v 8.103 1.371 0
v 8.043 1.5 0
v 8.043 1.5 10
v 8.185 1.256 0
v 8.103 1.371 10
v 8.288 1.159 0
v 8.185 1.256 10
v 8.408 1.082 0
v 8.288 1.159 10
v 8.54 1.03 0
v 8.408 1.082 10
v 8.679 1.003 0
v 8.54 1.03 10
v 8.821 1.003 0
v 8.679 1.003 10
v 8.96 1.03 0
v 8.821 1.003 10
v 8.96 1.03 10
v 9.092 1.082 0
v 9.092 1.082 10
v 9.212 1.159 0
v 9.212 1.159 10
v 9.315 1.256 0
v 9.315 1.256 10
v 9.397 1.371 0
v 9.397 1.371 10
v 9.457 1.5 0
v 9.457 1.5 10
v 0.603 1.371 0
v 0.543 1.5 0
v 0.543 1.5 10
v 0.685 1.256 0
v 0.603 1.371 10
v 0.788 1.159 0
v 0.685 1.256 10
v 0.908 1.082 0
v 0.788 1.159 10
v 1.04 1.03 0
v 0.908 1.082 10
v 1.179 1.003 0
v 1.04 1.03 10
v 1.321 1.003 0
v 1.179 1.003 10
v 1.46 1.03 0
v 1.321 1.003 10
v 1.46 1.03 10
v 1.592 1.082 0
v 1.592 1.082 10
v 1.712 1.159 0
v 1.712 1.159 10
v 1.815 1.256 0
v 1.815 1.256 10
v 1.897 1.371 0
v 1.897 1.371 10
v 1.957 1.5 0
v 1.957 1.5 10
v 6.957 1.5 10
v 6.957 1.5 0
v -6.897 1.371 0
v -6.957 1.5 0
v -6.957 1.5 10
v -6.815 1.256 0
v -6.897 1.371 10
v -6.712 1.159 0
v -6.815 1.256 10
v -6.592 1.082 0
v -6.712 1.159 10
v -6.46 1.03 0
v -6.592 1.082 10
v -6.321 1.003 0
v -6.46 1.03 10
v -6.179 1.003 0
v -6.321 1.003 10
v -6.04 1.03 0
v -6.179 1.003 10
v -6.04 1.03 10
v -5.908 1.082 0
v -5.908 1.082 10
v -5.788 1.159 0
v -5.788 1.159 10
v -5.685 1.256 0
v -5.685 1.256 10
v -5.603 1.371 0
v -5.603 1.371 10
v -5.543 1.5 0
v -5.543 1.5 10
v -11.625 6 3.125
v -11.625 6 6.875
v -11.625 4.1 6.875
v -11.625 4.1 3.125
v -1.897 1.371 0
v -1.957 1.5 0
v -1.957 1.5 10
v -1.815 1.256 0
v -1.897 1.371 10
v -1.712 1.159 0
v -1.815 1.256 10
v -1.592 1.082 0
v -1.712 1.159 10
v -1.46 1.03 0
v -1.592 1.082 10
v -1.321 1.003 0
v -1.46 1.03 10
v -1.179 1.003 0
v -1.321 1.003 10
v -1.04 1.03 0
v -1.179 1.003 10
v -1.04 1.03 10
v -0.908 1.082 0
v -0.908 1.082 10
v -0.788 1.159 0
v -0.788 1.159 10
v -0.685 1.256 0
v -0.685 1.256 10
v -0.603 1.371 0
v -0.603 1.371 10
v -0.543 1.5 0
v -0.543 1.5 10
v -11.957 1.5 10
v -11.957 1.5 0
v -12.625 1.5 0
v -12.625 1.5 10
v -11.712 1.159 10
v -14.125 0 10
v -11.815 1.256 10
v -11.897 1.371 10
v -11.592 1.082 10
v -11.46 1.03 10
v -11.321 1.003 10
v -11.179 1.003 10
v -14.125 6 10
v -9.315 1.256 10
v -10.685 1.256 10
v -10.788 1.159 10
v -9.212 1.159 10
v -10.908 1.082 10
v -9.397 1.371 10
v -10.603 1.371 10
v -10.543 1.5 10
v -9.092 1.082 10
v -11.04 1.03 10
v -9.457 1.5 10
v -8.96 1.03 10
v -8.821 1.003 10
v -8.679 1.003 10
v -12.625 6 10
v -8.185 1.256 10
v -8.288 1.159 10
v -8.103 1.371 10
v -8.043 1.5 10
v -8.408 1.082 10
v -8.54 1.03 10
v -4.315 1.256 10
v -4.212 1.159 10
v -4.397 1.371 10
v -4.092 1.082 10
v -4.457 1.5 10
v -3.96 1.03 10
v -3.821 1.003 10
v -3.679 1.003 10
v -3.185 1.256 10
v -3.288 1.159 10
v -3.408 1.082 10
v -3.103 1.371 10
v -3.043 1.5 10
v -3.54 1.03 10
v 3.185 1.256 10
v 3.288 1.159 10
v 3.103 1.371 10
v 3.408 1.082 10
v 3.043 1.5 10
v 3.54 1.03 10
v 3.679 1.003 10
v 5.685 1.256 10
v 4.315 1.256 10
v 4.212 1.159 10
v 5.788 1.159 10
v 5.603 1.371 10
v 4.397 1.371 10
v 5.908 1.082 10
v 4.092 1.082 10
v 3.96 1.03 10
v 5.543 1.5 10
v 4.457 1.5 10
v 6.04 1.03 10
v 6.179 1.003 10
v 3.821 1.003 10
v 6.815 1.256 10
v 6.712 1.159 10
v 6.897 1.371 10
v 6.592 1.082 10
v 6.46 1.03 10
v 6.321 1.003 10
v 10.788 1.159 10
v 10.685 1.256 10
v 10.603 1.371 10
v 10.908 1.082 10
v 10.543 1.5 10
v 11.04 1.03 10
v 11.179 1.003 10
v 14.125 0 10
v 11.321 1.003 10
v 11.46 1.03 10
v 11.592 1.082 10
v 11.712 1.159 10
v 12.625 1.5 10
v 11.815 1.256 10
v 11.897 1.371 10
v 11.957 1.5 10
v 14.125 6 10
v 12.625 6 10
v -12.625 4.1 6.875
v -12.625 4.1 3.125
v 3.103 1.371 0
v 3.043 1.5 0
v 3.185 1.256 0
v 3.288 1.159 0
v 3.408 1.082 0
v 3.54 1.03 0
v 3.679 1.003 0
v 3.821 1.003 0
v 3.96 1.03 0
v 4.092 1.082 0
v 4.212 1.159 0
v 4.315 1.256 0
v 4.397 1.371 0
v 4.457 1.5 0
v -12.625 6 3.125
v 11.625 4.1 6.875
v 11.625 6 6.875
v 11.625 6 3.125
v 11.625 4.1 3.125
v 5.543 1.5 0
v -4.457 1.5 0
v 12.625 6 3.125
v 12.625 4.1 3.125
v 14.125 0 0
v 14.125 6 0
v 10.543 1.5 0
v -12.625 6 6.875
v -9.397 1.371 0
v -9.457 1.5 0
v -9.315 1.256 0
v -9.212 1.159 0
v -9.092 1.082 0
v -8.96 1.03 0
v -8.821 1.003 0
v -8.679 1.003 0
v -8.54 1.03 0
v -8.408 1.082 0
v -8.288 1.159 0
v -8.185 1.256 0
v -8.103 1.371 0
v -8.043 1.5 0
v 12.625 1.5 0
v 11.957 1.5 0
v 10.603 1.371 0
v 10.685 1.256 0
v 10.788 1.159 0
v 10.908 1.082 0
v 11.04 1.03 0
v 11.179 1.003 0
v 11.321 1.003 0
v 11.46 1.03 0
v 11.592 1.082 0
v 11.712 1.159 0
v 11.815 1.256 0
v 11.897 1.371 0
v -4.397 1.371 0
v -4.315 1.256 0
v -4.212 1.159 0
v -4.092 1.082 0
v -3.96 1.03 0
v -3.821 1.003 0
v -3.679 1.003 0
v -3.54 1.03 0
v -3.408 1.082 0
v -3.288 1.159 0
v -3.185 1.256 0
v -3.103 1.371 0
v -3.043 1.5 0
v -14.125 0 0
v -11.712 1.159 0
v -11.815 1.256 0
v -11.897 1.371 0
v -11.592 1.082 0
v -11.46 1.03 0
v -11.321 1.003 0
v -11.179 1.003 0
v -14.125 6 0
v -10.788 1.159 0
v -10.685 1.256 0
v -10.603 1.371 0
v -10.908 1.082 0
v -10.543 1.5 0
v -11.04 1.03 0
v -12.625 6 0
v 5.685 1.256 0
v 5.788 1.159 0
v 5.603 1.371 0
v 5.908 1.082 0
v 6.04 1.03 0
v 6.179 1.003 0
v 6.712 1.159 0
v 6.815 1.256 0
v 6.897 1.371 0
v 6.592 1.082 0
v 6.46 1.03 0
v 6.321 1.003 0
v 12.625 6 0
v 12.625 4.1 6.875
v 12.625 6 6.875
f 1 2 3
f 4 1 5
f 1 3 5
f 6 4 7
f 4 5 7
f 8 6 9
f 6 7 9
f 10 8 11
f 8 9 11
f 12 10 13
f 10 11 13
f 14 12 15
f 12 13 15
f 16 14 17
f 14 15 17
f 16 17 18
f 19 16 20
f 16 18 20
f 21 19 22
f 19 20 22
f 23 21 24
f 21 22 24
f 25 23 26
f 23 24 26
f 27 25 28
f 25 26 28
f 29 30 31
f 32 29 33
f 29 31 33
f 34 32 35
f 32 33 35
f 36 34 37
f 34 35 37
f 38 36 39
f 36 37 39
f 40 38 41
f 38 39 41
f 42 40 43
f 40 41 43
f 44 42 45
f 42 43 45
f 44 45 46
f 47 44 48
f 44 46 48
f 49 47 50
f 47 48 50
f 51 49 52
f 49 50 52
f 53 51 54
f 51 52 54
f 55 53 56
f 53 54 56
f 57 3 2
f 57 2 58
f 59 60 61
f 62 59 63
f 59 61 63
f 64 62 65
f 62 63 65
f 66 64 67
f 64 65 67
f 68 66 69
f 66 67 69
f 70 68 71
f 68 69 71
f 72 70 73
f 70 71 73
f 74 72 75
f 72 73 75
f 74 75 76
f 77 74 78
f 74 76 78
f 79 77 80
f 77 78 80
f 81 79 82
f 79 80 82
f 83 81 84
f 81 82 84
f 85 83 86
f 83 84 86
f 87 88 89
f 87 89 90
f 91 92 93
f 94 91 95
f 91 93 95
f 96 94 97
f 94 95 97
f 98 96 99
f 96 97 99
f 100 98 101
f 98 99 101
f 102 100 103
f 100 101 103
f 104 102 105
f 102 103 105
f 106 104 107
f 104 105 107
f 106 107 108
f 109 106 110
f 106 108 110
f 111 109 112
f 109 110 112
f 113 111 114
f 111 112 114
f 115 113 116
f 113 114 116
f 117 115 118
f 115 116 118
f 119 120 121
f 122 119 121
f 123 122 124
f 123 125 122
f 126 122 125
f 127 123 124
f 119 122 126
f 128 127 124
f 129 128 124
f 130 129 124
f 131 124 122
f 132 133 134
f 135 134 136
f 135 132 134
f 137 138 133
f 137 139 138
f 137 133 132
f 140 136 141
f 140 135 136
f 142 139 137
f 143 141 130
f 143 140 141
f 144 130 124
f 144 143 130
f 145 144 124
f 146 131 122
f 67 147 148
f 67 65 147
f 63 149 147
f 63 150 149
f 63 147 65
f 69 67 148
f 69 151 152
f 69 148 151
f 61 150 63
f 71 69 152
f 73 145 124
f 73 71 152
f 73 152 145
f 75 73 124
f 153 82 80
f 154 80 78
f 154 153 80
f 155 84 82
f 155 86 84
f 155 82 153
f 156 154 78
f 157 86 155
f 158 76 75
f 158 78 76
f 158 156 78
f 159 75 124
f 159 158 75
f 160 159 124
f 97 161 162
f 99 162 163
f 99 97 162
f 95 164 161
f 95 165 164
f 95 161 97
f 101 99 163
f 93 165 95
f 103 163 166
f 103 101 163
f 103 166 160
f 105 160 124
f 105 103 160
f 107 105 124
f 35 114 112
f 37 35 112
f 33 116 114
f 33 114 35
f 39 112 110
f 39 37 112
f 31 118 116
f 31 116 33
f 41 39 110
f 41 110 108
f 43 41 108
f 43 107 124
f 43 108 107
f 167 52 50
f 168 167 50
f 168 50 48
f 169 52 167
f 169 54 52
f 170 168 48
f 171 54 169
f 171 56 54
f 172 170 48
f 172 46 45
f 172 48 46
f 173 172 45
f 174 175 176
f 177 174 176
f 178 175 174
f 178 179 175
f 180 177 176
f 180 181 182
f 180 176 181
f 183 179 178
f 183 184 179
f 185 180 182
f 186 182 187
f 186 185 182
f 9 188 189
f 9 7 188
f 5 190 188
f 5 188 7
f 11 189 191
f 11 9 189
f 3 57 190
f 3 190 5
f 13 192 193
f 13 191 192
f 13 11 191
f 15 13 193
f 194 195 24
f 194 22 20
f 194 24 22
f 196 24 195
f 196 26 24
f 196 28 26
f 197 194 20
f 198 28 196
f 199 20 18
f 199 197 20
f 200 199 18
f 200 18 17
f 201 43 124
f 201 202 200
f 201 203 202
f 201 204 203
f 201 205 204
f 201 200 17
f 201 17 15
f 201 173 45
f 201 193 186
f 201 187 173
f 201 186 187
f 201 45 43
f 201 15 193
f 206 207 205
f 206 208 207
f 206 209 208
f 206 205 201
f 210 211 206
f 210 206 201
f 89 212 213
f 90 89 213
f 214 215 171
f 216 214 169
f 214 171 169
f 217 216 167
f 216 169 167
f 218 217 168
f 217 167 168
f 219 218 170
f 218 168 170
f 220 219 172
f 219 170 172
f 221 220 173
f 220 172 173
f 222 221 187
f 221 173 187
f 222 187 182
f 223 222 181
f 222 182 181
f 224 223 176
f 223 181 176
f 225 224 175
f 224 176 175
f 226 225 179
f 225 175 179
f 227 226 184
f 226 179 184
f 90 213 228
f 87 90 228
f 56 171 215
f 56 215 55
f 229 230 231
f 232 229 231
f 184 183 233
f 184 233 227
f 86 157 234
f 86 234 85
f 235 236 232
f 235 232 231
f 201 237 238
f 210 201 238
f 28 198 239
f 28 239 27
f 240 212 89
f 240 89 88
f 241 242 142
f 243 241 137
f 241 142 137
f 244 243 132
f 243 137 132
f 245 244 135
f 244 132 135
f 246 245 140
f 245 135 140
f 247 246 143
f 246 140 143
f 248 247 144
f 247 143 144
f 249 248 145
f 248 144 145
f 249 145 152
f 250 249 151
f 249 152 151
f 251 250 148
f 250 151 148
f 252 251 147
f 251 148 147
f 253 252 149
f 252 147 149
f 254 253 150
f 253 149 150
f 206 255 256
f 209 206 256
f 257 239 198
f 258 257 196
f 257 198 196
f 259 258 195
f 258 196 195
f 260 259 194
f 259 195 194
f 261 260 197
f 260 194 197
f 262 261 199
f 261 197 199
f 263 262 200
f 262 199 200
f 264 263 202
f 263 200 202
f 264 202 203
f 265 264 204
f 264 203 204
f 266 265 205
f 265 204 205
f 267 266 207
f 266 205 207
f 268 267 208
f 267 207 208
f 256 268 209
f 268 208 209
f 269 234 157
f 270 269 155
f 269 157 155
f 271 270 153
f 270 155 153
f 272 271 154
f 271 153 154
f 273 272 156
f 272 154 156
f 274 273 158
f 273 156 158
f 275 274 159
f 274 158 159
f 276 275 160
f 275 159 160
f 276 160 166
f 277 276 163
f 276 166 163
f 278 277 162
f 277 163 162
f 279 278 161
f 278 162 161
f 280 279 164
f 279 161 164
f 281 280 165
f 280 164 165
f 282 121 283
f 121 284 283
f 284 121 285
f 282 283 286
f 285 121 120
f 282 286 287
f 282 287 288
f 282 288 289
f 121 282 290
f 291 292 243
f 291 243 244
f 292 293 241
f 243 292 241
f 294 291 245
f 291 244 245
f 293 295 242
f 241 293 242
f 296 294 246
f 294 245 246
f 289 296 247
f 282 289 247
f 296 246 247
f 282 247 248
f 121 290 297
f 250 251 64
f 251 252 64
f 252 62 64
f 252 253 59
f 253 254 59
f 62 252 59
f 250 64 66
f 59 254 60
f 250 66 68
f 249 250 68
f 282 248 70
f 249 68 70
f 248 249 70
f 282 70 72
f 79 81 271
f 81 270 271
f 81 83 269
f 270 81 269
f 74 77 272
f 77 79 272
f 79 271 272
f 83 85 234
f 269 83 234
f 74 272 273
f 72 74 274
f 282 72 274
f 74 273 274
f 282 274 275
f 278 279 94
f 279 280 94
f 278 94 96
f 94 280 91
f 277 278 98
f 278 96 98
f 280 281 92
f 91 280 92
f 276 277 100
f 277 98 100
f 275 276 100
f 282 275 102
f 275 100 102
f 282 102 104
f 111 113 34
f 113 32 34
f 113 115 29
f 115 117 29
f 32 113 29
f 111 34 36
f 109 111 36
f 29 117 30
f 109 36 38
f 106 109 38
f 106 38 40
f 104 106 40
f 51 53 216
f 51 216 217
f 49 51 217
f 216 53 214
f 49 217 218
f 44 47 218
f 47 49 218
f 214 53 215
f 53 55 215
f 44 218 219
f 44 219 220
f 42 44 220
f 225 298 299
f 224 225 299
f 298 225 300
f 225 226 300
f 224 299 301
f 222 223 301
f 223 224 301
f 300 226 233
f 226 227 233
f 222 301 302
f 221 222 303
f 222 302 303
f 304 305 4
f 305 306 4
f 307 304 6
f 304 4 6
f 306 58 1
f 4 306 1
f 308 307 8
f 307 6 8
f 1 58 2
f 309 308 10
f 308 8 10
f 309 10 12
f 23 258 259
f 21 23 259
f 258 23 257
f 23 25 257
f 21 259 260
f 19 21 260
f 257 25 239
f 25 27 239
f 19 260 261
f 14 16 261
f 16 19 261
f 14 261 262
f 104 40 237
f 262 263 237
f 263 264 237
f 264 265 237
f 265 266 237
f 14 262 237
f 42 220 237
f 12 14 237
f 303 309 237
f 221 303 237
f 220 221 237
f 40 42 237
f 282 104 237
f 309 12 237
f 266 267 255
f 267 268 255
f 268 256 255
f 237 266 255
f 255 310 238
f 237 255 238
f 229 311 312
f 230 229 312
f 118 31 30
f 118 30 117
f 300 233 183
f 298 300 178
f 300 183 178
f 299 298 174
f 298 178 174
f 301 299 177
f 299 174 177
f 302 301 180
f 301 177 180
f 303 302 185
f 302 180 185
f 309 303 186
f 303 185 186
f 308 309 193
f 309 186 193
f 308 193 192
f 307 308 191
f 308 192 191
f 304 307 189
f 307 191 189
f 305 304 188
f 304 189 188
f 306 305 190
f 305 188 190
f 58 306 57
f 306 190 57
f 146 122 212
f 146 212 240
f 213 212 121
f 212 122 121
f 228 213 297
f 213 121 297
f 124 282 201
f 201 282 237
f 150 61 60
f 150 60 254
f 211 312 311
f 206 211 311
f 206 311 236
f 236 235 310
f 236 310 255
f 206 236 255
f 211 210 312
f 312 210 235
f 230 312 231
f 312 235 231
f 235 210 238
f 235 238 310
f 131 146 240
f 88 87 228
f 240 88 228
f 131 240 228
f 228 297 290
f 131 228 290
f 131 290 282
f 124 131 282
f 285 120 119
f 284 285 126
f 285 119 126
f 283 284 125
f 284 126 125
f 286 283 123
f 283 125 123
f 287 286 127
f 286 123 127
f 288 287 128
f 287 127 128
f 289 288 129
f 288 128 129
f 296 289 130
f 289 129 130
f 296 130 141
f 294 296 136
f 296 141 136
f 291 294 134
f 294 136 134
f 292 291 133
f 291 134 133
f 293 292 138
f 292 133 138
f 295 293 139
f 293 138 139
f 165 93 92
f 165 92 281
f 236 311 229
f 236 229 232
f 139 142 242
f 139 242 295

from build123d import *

# Parameters (mm, degrees)
BOSS_EXTRUDE1_DEPTH = 10
SKETCH3_R           = 0.75
CUT_EXTRUDE1_DEPTH  = 19.317085603
SKETCH4_W           = 3.75
SKETCH4_H           = 1.9
BOSS_EXTRUDE2_DEPTH = 1


with BuildPart() as part:
    # Sketch2 → Boss-Extrude1 (new body)
    with BuildSketch(Plane.XY):
        Polygon((-12.625, 6), (-14.125, 6), (-14.125, 0), (14.125, 0), (14.125, 6), (12.625, 6), (12.625, 1.5), (-12.625, 1.5), align=None)
    extrude(amount=BOSS_EXTRUDE1_DEPTH)

    # Sketch3 → Cut-Extrude1 (cut, through all)
    with BuildSketch(Plane.XY.offset(10)):
        with Locations((-11.25, 1.75)):
            Circle(SKETCH3_R)
        with Locations((-8.75, 1.75)):
            Circle(SKETCH3_R)
        with Locations((-6.25, 1.75)):
            Circle(SKETCH3_R)
        with Locations((-3.75, 1.75)):
            Circle(SKETCH3_R)
        with Locations((-1.25, 1.75)):
            Circle(SKETCH3_R)
        with Locations((1.25, 1.75)):
            Circle(SKETCH3_R)
        with Locations((3.75, 1.75)):
            Circle(SKETCH3_R)
        with Locations((6.25, 1.75)):
            Circle(SKETCH3_R)
        with Locations((8.75, 1.75)):
            Circle(SKETCH3_R)
        with Locations((11.25, 1.75)):
            Circle(SKETCH3_R)
    extrude(amount=-CUT_EXTRUDE1_DEPTH, mode=Mode.SUBTRACT)

    # Sketch4 → Boss-Extrude2 (add)
    with BuildSketch(Plane(origin=(-12.625, 0, 0), x_dir=(0, 0, -1), z_dir=(1, 0, 0))):
        with Locations((-5, 5.05)):
            Rectangle(SKETCH4_W, SKETCH4_H)
    boss_extrude2 = extrude(amount=BOSS_EXTRUDE2_DEPTH)

    # Mirror1: Boss-Extrude2 across plane
    add(boss_extrude2.mirror(Plane.ZY))


solid = part.part
